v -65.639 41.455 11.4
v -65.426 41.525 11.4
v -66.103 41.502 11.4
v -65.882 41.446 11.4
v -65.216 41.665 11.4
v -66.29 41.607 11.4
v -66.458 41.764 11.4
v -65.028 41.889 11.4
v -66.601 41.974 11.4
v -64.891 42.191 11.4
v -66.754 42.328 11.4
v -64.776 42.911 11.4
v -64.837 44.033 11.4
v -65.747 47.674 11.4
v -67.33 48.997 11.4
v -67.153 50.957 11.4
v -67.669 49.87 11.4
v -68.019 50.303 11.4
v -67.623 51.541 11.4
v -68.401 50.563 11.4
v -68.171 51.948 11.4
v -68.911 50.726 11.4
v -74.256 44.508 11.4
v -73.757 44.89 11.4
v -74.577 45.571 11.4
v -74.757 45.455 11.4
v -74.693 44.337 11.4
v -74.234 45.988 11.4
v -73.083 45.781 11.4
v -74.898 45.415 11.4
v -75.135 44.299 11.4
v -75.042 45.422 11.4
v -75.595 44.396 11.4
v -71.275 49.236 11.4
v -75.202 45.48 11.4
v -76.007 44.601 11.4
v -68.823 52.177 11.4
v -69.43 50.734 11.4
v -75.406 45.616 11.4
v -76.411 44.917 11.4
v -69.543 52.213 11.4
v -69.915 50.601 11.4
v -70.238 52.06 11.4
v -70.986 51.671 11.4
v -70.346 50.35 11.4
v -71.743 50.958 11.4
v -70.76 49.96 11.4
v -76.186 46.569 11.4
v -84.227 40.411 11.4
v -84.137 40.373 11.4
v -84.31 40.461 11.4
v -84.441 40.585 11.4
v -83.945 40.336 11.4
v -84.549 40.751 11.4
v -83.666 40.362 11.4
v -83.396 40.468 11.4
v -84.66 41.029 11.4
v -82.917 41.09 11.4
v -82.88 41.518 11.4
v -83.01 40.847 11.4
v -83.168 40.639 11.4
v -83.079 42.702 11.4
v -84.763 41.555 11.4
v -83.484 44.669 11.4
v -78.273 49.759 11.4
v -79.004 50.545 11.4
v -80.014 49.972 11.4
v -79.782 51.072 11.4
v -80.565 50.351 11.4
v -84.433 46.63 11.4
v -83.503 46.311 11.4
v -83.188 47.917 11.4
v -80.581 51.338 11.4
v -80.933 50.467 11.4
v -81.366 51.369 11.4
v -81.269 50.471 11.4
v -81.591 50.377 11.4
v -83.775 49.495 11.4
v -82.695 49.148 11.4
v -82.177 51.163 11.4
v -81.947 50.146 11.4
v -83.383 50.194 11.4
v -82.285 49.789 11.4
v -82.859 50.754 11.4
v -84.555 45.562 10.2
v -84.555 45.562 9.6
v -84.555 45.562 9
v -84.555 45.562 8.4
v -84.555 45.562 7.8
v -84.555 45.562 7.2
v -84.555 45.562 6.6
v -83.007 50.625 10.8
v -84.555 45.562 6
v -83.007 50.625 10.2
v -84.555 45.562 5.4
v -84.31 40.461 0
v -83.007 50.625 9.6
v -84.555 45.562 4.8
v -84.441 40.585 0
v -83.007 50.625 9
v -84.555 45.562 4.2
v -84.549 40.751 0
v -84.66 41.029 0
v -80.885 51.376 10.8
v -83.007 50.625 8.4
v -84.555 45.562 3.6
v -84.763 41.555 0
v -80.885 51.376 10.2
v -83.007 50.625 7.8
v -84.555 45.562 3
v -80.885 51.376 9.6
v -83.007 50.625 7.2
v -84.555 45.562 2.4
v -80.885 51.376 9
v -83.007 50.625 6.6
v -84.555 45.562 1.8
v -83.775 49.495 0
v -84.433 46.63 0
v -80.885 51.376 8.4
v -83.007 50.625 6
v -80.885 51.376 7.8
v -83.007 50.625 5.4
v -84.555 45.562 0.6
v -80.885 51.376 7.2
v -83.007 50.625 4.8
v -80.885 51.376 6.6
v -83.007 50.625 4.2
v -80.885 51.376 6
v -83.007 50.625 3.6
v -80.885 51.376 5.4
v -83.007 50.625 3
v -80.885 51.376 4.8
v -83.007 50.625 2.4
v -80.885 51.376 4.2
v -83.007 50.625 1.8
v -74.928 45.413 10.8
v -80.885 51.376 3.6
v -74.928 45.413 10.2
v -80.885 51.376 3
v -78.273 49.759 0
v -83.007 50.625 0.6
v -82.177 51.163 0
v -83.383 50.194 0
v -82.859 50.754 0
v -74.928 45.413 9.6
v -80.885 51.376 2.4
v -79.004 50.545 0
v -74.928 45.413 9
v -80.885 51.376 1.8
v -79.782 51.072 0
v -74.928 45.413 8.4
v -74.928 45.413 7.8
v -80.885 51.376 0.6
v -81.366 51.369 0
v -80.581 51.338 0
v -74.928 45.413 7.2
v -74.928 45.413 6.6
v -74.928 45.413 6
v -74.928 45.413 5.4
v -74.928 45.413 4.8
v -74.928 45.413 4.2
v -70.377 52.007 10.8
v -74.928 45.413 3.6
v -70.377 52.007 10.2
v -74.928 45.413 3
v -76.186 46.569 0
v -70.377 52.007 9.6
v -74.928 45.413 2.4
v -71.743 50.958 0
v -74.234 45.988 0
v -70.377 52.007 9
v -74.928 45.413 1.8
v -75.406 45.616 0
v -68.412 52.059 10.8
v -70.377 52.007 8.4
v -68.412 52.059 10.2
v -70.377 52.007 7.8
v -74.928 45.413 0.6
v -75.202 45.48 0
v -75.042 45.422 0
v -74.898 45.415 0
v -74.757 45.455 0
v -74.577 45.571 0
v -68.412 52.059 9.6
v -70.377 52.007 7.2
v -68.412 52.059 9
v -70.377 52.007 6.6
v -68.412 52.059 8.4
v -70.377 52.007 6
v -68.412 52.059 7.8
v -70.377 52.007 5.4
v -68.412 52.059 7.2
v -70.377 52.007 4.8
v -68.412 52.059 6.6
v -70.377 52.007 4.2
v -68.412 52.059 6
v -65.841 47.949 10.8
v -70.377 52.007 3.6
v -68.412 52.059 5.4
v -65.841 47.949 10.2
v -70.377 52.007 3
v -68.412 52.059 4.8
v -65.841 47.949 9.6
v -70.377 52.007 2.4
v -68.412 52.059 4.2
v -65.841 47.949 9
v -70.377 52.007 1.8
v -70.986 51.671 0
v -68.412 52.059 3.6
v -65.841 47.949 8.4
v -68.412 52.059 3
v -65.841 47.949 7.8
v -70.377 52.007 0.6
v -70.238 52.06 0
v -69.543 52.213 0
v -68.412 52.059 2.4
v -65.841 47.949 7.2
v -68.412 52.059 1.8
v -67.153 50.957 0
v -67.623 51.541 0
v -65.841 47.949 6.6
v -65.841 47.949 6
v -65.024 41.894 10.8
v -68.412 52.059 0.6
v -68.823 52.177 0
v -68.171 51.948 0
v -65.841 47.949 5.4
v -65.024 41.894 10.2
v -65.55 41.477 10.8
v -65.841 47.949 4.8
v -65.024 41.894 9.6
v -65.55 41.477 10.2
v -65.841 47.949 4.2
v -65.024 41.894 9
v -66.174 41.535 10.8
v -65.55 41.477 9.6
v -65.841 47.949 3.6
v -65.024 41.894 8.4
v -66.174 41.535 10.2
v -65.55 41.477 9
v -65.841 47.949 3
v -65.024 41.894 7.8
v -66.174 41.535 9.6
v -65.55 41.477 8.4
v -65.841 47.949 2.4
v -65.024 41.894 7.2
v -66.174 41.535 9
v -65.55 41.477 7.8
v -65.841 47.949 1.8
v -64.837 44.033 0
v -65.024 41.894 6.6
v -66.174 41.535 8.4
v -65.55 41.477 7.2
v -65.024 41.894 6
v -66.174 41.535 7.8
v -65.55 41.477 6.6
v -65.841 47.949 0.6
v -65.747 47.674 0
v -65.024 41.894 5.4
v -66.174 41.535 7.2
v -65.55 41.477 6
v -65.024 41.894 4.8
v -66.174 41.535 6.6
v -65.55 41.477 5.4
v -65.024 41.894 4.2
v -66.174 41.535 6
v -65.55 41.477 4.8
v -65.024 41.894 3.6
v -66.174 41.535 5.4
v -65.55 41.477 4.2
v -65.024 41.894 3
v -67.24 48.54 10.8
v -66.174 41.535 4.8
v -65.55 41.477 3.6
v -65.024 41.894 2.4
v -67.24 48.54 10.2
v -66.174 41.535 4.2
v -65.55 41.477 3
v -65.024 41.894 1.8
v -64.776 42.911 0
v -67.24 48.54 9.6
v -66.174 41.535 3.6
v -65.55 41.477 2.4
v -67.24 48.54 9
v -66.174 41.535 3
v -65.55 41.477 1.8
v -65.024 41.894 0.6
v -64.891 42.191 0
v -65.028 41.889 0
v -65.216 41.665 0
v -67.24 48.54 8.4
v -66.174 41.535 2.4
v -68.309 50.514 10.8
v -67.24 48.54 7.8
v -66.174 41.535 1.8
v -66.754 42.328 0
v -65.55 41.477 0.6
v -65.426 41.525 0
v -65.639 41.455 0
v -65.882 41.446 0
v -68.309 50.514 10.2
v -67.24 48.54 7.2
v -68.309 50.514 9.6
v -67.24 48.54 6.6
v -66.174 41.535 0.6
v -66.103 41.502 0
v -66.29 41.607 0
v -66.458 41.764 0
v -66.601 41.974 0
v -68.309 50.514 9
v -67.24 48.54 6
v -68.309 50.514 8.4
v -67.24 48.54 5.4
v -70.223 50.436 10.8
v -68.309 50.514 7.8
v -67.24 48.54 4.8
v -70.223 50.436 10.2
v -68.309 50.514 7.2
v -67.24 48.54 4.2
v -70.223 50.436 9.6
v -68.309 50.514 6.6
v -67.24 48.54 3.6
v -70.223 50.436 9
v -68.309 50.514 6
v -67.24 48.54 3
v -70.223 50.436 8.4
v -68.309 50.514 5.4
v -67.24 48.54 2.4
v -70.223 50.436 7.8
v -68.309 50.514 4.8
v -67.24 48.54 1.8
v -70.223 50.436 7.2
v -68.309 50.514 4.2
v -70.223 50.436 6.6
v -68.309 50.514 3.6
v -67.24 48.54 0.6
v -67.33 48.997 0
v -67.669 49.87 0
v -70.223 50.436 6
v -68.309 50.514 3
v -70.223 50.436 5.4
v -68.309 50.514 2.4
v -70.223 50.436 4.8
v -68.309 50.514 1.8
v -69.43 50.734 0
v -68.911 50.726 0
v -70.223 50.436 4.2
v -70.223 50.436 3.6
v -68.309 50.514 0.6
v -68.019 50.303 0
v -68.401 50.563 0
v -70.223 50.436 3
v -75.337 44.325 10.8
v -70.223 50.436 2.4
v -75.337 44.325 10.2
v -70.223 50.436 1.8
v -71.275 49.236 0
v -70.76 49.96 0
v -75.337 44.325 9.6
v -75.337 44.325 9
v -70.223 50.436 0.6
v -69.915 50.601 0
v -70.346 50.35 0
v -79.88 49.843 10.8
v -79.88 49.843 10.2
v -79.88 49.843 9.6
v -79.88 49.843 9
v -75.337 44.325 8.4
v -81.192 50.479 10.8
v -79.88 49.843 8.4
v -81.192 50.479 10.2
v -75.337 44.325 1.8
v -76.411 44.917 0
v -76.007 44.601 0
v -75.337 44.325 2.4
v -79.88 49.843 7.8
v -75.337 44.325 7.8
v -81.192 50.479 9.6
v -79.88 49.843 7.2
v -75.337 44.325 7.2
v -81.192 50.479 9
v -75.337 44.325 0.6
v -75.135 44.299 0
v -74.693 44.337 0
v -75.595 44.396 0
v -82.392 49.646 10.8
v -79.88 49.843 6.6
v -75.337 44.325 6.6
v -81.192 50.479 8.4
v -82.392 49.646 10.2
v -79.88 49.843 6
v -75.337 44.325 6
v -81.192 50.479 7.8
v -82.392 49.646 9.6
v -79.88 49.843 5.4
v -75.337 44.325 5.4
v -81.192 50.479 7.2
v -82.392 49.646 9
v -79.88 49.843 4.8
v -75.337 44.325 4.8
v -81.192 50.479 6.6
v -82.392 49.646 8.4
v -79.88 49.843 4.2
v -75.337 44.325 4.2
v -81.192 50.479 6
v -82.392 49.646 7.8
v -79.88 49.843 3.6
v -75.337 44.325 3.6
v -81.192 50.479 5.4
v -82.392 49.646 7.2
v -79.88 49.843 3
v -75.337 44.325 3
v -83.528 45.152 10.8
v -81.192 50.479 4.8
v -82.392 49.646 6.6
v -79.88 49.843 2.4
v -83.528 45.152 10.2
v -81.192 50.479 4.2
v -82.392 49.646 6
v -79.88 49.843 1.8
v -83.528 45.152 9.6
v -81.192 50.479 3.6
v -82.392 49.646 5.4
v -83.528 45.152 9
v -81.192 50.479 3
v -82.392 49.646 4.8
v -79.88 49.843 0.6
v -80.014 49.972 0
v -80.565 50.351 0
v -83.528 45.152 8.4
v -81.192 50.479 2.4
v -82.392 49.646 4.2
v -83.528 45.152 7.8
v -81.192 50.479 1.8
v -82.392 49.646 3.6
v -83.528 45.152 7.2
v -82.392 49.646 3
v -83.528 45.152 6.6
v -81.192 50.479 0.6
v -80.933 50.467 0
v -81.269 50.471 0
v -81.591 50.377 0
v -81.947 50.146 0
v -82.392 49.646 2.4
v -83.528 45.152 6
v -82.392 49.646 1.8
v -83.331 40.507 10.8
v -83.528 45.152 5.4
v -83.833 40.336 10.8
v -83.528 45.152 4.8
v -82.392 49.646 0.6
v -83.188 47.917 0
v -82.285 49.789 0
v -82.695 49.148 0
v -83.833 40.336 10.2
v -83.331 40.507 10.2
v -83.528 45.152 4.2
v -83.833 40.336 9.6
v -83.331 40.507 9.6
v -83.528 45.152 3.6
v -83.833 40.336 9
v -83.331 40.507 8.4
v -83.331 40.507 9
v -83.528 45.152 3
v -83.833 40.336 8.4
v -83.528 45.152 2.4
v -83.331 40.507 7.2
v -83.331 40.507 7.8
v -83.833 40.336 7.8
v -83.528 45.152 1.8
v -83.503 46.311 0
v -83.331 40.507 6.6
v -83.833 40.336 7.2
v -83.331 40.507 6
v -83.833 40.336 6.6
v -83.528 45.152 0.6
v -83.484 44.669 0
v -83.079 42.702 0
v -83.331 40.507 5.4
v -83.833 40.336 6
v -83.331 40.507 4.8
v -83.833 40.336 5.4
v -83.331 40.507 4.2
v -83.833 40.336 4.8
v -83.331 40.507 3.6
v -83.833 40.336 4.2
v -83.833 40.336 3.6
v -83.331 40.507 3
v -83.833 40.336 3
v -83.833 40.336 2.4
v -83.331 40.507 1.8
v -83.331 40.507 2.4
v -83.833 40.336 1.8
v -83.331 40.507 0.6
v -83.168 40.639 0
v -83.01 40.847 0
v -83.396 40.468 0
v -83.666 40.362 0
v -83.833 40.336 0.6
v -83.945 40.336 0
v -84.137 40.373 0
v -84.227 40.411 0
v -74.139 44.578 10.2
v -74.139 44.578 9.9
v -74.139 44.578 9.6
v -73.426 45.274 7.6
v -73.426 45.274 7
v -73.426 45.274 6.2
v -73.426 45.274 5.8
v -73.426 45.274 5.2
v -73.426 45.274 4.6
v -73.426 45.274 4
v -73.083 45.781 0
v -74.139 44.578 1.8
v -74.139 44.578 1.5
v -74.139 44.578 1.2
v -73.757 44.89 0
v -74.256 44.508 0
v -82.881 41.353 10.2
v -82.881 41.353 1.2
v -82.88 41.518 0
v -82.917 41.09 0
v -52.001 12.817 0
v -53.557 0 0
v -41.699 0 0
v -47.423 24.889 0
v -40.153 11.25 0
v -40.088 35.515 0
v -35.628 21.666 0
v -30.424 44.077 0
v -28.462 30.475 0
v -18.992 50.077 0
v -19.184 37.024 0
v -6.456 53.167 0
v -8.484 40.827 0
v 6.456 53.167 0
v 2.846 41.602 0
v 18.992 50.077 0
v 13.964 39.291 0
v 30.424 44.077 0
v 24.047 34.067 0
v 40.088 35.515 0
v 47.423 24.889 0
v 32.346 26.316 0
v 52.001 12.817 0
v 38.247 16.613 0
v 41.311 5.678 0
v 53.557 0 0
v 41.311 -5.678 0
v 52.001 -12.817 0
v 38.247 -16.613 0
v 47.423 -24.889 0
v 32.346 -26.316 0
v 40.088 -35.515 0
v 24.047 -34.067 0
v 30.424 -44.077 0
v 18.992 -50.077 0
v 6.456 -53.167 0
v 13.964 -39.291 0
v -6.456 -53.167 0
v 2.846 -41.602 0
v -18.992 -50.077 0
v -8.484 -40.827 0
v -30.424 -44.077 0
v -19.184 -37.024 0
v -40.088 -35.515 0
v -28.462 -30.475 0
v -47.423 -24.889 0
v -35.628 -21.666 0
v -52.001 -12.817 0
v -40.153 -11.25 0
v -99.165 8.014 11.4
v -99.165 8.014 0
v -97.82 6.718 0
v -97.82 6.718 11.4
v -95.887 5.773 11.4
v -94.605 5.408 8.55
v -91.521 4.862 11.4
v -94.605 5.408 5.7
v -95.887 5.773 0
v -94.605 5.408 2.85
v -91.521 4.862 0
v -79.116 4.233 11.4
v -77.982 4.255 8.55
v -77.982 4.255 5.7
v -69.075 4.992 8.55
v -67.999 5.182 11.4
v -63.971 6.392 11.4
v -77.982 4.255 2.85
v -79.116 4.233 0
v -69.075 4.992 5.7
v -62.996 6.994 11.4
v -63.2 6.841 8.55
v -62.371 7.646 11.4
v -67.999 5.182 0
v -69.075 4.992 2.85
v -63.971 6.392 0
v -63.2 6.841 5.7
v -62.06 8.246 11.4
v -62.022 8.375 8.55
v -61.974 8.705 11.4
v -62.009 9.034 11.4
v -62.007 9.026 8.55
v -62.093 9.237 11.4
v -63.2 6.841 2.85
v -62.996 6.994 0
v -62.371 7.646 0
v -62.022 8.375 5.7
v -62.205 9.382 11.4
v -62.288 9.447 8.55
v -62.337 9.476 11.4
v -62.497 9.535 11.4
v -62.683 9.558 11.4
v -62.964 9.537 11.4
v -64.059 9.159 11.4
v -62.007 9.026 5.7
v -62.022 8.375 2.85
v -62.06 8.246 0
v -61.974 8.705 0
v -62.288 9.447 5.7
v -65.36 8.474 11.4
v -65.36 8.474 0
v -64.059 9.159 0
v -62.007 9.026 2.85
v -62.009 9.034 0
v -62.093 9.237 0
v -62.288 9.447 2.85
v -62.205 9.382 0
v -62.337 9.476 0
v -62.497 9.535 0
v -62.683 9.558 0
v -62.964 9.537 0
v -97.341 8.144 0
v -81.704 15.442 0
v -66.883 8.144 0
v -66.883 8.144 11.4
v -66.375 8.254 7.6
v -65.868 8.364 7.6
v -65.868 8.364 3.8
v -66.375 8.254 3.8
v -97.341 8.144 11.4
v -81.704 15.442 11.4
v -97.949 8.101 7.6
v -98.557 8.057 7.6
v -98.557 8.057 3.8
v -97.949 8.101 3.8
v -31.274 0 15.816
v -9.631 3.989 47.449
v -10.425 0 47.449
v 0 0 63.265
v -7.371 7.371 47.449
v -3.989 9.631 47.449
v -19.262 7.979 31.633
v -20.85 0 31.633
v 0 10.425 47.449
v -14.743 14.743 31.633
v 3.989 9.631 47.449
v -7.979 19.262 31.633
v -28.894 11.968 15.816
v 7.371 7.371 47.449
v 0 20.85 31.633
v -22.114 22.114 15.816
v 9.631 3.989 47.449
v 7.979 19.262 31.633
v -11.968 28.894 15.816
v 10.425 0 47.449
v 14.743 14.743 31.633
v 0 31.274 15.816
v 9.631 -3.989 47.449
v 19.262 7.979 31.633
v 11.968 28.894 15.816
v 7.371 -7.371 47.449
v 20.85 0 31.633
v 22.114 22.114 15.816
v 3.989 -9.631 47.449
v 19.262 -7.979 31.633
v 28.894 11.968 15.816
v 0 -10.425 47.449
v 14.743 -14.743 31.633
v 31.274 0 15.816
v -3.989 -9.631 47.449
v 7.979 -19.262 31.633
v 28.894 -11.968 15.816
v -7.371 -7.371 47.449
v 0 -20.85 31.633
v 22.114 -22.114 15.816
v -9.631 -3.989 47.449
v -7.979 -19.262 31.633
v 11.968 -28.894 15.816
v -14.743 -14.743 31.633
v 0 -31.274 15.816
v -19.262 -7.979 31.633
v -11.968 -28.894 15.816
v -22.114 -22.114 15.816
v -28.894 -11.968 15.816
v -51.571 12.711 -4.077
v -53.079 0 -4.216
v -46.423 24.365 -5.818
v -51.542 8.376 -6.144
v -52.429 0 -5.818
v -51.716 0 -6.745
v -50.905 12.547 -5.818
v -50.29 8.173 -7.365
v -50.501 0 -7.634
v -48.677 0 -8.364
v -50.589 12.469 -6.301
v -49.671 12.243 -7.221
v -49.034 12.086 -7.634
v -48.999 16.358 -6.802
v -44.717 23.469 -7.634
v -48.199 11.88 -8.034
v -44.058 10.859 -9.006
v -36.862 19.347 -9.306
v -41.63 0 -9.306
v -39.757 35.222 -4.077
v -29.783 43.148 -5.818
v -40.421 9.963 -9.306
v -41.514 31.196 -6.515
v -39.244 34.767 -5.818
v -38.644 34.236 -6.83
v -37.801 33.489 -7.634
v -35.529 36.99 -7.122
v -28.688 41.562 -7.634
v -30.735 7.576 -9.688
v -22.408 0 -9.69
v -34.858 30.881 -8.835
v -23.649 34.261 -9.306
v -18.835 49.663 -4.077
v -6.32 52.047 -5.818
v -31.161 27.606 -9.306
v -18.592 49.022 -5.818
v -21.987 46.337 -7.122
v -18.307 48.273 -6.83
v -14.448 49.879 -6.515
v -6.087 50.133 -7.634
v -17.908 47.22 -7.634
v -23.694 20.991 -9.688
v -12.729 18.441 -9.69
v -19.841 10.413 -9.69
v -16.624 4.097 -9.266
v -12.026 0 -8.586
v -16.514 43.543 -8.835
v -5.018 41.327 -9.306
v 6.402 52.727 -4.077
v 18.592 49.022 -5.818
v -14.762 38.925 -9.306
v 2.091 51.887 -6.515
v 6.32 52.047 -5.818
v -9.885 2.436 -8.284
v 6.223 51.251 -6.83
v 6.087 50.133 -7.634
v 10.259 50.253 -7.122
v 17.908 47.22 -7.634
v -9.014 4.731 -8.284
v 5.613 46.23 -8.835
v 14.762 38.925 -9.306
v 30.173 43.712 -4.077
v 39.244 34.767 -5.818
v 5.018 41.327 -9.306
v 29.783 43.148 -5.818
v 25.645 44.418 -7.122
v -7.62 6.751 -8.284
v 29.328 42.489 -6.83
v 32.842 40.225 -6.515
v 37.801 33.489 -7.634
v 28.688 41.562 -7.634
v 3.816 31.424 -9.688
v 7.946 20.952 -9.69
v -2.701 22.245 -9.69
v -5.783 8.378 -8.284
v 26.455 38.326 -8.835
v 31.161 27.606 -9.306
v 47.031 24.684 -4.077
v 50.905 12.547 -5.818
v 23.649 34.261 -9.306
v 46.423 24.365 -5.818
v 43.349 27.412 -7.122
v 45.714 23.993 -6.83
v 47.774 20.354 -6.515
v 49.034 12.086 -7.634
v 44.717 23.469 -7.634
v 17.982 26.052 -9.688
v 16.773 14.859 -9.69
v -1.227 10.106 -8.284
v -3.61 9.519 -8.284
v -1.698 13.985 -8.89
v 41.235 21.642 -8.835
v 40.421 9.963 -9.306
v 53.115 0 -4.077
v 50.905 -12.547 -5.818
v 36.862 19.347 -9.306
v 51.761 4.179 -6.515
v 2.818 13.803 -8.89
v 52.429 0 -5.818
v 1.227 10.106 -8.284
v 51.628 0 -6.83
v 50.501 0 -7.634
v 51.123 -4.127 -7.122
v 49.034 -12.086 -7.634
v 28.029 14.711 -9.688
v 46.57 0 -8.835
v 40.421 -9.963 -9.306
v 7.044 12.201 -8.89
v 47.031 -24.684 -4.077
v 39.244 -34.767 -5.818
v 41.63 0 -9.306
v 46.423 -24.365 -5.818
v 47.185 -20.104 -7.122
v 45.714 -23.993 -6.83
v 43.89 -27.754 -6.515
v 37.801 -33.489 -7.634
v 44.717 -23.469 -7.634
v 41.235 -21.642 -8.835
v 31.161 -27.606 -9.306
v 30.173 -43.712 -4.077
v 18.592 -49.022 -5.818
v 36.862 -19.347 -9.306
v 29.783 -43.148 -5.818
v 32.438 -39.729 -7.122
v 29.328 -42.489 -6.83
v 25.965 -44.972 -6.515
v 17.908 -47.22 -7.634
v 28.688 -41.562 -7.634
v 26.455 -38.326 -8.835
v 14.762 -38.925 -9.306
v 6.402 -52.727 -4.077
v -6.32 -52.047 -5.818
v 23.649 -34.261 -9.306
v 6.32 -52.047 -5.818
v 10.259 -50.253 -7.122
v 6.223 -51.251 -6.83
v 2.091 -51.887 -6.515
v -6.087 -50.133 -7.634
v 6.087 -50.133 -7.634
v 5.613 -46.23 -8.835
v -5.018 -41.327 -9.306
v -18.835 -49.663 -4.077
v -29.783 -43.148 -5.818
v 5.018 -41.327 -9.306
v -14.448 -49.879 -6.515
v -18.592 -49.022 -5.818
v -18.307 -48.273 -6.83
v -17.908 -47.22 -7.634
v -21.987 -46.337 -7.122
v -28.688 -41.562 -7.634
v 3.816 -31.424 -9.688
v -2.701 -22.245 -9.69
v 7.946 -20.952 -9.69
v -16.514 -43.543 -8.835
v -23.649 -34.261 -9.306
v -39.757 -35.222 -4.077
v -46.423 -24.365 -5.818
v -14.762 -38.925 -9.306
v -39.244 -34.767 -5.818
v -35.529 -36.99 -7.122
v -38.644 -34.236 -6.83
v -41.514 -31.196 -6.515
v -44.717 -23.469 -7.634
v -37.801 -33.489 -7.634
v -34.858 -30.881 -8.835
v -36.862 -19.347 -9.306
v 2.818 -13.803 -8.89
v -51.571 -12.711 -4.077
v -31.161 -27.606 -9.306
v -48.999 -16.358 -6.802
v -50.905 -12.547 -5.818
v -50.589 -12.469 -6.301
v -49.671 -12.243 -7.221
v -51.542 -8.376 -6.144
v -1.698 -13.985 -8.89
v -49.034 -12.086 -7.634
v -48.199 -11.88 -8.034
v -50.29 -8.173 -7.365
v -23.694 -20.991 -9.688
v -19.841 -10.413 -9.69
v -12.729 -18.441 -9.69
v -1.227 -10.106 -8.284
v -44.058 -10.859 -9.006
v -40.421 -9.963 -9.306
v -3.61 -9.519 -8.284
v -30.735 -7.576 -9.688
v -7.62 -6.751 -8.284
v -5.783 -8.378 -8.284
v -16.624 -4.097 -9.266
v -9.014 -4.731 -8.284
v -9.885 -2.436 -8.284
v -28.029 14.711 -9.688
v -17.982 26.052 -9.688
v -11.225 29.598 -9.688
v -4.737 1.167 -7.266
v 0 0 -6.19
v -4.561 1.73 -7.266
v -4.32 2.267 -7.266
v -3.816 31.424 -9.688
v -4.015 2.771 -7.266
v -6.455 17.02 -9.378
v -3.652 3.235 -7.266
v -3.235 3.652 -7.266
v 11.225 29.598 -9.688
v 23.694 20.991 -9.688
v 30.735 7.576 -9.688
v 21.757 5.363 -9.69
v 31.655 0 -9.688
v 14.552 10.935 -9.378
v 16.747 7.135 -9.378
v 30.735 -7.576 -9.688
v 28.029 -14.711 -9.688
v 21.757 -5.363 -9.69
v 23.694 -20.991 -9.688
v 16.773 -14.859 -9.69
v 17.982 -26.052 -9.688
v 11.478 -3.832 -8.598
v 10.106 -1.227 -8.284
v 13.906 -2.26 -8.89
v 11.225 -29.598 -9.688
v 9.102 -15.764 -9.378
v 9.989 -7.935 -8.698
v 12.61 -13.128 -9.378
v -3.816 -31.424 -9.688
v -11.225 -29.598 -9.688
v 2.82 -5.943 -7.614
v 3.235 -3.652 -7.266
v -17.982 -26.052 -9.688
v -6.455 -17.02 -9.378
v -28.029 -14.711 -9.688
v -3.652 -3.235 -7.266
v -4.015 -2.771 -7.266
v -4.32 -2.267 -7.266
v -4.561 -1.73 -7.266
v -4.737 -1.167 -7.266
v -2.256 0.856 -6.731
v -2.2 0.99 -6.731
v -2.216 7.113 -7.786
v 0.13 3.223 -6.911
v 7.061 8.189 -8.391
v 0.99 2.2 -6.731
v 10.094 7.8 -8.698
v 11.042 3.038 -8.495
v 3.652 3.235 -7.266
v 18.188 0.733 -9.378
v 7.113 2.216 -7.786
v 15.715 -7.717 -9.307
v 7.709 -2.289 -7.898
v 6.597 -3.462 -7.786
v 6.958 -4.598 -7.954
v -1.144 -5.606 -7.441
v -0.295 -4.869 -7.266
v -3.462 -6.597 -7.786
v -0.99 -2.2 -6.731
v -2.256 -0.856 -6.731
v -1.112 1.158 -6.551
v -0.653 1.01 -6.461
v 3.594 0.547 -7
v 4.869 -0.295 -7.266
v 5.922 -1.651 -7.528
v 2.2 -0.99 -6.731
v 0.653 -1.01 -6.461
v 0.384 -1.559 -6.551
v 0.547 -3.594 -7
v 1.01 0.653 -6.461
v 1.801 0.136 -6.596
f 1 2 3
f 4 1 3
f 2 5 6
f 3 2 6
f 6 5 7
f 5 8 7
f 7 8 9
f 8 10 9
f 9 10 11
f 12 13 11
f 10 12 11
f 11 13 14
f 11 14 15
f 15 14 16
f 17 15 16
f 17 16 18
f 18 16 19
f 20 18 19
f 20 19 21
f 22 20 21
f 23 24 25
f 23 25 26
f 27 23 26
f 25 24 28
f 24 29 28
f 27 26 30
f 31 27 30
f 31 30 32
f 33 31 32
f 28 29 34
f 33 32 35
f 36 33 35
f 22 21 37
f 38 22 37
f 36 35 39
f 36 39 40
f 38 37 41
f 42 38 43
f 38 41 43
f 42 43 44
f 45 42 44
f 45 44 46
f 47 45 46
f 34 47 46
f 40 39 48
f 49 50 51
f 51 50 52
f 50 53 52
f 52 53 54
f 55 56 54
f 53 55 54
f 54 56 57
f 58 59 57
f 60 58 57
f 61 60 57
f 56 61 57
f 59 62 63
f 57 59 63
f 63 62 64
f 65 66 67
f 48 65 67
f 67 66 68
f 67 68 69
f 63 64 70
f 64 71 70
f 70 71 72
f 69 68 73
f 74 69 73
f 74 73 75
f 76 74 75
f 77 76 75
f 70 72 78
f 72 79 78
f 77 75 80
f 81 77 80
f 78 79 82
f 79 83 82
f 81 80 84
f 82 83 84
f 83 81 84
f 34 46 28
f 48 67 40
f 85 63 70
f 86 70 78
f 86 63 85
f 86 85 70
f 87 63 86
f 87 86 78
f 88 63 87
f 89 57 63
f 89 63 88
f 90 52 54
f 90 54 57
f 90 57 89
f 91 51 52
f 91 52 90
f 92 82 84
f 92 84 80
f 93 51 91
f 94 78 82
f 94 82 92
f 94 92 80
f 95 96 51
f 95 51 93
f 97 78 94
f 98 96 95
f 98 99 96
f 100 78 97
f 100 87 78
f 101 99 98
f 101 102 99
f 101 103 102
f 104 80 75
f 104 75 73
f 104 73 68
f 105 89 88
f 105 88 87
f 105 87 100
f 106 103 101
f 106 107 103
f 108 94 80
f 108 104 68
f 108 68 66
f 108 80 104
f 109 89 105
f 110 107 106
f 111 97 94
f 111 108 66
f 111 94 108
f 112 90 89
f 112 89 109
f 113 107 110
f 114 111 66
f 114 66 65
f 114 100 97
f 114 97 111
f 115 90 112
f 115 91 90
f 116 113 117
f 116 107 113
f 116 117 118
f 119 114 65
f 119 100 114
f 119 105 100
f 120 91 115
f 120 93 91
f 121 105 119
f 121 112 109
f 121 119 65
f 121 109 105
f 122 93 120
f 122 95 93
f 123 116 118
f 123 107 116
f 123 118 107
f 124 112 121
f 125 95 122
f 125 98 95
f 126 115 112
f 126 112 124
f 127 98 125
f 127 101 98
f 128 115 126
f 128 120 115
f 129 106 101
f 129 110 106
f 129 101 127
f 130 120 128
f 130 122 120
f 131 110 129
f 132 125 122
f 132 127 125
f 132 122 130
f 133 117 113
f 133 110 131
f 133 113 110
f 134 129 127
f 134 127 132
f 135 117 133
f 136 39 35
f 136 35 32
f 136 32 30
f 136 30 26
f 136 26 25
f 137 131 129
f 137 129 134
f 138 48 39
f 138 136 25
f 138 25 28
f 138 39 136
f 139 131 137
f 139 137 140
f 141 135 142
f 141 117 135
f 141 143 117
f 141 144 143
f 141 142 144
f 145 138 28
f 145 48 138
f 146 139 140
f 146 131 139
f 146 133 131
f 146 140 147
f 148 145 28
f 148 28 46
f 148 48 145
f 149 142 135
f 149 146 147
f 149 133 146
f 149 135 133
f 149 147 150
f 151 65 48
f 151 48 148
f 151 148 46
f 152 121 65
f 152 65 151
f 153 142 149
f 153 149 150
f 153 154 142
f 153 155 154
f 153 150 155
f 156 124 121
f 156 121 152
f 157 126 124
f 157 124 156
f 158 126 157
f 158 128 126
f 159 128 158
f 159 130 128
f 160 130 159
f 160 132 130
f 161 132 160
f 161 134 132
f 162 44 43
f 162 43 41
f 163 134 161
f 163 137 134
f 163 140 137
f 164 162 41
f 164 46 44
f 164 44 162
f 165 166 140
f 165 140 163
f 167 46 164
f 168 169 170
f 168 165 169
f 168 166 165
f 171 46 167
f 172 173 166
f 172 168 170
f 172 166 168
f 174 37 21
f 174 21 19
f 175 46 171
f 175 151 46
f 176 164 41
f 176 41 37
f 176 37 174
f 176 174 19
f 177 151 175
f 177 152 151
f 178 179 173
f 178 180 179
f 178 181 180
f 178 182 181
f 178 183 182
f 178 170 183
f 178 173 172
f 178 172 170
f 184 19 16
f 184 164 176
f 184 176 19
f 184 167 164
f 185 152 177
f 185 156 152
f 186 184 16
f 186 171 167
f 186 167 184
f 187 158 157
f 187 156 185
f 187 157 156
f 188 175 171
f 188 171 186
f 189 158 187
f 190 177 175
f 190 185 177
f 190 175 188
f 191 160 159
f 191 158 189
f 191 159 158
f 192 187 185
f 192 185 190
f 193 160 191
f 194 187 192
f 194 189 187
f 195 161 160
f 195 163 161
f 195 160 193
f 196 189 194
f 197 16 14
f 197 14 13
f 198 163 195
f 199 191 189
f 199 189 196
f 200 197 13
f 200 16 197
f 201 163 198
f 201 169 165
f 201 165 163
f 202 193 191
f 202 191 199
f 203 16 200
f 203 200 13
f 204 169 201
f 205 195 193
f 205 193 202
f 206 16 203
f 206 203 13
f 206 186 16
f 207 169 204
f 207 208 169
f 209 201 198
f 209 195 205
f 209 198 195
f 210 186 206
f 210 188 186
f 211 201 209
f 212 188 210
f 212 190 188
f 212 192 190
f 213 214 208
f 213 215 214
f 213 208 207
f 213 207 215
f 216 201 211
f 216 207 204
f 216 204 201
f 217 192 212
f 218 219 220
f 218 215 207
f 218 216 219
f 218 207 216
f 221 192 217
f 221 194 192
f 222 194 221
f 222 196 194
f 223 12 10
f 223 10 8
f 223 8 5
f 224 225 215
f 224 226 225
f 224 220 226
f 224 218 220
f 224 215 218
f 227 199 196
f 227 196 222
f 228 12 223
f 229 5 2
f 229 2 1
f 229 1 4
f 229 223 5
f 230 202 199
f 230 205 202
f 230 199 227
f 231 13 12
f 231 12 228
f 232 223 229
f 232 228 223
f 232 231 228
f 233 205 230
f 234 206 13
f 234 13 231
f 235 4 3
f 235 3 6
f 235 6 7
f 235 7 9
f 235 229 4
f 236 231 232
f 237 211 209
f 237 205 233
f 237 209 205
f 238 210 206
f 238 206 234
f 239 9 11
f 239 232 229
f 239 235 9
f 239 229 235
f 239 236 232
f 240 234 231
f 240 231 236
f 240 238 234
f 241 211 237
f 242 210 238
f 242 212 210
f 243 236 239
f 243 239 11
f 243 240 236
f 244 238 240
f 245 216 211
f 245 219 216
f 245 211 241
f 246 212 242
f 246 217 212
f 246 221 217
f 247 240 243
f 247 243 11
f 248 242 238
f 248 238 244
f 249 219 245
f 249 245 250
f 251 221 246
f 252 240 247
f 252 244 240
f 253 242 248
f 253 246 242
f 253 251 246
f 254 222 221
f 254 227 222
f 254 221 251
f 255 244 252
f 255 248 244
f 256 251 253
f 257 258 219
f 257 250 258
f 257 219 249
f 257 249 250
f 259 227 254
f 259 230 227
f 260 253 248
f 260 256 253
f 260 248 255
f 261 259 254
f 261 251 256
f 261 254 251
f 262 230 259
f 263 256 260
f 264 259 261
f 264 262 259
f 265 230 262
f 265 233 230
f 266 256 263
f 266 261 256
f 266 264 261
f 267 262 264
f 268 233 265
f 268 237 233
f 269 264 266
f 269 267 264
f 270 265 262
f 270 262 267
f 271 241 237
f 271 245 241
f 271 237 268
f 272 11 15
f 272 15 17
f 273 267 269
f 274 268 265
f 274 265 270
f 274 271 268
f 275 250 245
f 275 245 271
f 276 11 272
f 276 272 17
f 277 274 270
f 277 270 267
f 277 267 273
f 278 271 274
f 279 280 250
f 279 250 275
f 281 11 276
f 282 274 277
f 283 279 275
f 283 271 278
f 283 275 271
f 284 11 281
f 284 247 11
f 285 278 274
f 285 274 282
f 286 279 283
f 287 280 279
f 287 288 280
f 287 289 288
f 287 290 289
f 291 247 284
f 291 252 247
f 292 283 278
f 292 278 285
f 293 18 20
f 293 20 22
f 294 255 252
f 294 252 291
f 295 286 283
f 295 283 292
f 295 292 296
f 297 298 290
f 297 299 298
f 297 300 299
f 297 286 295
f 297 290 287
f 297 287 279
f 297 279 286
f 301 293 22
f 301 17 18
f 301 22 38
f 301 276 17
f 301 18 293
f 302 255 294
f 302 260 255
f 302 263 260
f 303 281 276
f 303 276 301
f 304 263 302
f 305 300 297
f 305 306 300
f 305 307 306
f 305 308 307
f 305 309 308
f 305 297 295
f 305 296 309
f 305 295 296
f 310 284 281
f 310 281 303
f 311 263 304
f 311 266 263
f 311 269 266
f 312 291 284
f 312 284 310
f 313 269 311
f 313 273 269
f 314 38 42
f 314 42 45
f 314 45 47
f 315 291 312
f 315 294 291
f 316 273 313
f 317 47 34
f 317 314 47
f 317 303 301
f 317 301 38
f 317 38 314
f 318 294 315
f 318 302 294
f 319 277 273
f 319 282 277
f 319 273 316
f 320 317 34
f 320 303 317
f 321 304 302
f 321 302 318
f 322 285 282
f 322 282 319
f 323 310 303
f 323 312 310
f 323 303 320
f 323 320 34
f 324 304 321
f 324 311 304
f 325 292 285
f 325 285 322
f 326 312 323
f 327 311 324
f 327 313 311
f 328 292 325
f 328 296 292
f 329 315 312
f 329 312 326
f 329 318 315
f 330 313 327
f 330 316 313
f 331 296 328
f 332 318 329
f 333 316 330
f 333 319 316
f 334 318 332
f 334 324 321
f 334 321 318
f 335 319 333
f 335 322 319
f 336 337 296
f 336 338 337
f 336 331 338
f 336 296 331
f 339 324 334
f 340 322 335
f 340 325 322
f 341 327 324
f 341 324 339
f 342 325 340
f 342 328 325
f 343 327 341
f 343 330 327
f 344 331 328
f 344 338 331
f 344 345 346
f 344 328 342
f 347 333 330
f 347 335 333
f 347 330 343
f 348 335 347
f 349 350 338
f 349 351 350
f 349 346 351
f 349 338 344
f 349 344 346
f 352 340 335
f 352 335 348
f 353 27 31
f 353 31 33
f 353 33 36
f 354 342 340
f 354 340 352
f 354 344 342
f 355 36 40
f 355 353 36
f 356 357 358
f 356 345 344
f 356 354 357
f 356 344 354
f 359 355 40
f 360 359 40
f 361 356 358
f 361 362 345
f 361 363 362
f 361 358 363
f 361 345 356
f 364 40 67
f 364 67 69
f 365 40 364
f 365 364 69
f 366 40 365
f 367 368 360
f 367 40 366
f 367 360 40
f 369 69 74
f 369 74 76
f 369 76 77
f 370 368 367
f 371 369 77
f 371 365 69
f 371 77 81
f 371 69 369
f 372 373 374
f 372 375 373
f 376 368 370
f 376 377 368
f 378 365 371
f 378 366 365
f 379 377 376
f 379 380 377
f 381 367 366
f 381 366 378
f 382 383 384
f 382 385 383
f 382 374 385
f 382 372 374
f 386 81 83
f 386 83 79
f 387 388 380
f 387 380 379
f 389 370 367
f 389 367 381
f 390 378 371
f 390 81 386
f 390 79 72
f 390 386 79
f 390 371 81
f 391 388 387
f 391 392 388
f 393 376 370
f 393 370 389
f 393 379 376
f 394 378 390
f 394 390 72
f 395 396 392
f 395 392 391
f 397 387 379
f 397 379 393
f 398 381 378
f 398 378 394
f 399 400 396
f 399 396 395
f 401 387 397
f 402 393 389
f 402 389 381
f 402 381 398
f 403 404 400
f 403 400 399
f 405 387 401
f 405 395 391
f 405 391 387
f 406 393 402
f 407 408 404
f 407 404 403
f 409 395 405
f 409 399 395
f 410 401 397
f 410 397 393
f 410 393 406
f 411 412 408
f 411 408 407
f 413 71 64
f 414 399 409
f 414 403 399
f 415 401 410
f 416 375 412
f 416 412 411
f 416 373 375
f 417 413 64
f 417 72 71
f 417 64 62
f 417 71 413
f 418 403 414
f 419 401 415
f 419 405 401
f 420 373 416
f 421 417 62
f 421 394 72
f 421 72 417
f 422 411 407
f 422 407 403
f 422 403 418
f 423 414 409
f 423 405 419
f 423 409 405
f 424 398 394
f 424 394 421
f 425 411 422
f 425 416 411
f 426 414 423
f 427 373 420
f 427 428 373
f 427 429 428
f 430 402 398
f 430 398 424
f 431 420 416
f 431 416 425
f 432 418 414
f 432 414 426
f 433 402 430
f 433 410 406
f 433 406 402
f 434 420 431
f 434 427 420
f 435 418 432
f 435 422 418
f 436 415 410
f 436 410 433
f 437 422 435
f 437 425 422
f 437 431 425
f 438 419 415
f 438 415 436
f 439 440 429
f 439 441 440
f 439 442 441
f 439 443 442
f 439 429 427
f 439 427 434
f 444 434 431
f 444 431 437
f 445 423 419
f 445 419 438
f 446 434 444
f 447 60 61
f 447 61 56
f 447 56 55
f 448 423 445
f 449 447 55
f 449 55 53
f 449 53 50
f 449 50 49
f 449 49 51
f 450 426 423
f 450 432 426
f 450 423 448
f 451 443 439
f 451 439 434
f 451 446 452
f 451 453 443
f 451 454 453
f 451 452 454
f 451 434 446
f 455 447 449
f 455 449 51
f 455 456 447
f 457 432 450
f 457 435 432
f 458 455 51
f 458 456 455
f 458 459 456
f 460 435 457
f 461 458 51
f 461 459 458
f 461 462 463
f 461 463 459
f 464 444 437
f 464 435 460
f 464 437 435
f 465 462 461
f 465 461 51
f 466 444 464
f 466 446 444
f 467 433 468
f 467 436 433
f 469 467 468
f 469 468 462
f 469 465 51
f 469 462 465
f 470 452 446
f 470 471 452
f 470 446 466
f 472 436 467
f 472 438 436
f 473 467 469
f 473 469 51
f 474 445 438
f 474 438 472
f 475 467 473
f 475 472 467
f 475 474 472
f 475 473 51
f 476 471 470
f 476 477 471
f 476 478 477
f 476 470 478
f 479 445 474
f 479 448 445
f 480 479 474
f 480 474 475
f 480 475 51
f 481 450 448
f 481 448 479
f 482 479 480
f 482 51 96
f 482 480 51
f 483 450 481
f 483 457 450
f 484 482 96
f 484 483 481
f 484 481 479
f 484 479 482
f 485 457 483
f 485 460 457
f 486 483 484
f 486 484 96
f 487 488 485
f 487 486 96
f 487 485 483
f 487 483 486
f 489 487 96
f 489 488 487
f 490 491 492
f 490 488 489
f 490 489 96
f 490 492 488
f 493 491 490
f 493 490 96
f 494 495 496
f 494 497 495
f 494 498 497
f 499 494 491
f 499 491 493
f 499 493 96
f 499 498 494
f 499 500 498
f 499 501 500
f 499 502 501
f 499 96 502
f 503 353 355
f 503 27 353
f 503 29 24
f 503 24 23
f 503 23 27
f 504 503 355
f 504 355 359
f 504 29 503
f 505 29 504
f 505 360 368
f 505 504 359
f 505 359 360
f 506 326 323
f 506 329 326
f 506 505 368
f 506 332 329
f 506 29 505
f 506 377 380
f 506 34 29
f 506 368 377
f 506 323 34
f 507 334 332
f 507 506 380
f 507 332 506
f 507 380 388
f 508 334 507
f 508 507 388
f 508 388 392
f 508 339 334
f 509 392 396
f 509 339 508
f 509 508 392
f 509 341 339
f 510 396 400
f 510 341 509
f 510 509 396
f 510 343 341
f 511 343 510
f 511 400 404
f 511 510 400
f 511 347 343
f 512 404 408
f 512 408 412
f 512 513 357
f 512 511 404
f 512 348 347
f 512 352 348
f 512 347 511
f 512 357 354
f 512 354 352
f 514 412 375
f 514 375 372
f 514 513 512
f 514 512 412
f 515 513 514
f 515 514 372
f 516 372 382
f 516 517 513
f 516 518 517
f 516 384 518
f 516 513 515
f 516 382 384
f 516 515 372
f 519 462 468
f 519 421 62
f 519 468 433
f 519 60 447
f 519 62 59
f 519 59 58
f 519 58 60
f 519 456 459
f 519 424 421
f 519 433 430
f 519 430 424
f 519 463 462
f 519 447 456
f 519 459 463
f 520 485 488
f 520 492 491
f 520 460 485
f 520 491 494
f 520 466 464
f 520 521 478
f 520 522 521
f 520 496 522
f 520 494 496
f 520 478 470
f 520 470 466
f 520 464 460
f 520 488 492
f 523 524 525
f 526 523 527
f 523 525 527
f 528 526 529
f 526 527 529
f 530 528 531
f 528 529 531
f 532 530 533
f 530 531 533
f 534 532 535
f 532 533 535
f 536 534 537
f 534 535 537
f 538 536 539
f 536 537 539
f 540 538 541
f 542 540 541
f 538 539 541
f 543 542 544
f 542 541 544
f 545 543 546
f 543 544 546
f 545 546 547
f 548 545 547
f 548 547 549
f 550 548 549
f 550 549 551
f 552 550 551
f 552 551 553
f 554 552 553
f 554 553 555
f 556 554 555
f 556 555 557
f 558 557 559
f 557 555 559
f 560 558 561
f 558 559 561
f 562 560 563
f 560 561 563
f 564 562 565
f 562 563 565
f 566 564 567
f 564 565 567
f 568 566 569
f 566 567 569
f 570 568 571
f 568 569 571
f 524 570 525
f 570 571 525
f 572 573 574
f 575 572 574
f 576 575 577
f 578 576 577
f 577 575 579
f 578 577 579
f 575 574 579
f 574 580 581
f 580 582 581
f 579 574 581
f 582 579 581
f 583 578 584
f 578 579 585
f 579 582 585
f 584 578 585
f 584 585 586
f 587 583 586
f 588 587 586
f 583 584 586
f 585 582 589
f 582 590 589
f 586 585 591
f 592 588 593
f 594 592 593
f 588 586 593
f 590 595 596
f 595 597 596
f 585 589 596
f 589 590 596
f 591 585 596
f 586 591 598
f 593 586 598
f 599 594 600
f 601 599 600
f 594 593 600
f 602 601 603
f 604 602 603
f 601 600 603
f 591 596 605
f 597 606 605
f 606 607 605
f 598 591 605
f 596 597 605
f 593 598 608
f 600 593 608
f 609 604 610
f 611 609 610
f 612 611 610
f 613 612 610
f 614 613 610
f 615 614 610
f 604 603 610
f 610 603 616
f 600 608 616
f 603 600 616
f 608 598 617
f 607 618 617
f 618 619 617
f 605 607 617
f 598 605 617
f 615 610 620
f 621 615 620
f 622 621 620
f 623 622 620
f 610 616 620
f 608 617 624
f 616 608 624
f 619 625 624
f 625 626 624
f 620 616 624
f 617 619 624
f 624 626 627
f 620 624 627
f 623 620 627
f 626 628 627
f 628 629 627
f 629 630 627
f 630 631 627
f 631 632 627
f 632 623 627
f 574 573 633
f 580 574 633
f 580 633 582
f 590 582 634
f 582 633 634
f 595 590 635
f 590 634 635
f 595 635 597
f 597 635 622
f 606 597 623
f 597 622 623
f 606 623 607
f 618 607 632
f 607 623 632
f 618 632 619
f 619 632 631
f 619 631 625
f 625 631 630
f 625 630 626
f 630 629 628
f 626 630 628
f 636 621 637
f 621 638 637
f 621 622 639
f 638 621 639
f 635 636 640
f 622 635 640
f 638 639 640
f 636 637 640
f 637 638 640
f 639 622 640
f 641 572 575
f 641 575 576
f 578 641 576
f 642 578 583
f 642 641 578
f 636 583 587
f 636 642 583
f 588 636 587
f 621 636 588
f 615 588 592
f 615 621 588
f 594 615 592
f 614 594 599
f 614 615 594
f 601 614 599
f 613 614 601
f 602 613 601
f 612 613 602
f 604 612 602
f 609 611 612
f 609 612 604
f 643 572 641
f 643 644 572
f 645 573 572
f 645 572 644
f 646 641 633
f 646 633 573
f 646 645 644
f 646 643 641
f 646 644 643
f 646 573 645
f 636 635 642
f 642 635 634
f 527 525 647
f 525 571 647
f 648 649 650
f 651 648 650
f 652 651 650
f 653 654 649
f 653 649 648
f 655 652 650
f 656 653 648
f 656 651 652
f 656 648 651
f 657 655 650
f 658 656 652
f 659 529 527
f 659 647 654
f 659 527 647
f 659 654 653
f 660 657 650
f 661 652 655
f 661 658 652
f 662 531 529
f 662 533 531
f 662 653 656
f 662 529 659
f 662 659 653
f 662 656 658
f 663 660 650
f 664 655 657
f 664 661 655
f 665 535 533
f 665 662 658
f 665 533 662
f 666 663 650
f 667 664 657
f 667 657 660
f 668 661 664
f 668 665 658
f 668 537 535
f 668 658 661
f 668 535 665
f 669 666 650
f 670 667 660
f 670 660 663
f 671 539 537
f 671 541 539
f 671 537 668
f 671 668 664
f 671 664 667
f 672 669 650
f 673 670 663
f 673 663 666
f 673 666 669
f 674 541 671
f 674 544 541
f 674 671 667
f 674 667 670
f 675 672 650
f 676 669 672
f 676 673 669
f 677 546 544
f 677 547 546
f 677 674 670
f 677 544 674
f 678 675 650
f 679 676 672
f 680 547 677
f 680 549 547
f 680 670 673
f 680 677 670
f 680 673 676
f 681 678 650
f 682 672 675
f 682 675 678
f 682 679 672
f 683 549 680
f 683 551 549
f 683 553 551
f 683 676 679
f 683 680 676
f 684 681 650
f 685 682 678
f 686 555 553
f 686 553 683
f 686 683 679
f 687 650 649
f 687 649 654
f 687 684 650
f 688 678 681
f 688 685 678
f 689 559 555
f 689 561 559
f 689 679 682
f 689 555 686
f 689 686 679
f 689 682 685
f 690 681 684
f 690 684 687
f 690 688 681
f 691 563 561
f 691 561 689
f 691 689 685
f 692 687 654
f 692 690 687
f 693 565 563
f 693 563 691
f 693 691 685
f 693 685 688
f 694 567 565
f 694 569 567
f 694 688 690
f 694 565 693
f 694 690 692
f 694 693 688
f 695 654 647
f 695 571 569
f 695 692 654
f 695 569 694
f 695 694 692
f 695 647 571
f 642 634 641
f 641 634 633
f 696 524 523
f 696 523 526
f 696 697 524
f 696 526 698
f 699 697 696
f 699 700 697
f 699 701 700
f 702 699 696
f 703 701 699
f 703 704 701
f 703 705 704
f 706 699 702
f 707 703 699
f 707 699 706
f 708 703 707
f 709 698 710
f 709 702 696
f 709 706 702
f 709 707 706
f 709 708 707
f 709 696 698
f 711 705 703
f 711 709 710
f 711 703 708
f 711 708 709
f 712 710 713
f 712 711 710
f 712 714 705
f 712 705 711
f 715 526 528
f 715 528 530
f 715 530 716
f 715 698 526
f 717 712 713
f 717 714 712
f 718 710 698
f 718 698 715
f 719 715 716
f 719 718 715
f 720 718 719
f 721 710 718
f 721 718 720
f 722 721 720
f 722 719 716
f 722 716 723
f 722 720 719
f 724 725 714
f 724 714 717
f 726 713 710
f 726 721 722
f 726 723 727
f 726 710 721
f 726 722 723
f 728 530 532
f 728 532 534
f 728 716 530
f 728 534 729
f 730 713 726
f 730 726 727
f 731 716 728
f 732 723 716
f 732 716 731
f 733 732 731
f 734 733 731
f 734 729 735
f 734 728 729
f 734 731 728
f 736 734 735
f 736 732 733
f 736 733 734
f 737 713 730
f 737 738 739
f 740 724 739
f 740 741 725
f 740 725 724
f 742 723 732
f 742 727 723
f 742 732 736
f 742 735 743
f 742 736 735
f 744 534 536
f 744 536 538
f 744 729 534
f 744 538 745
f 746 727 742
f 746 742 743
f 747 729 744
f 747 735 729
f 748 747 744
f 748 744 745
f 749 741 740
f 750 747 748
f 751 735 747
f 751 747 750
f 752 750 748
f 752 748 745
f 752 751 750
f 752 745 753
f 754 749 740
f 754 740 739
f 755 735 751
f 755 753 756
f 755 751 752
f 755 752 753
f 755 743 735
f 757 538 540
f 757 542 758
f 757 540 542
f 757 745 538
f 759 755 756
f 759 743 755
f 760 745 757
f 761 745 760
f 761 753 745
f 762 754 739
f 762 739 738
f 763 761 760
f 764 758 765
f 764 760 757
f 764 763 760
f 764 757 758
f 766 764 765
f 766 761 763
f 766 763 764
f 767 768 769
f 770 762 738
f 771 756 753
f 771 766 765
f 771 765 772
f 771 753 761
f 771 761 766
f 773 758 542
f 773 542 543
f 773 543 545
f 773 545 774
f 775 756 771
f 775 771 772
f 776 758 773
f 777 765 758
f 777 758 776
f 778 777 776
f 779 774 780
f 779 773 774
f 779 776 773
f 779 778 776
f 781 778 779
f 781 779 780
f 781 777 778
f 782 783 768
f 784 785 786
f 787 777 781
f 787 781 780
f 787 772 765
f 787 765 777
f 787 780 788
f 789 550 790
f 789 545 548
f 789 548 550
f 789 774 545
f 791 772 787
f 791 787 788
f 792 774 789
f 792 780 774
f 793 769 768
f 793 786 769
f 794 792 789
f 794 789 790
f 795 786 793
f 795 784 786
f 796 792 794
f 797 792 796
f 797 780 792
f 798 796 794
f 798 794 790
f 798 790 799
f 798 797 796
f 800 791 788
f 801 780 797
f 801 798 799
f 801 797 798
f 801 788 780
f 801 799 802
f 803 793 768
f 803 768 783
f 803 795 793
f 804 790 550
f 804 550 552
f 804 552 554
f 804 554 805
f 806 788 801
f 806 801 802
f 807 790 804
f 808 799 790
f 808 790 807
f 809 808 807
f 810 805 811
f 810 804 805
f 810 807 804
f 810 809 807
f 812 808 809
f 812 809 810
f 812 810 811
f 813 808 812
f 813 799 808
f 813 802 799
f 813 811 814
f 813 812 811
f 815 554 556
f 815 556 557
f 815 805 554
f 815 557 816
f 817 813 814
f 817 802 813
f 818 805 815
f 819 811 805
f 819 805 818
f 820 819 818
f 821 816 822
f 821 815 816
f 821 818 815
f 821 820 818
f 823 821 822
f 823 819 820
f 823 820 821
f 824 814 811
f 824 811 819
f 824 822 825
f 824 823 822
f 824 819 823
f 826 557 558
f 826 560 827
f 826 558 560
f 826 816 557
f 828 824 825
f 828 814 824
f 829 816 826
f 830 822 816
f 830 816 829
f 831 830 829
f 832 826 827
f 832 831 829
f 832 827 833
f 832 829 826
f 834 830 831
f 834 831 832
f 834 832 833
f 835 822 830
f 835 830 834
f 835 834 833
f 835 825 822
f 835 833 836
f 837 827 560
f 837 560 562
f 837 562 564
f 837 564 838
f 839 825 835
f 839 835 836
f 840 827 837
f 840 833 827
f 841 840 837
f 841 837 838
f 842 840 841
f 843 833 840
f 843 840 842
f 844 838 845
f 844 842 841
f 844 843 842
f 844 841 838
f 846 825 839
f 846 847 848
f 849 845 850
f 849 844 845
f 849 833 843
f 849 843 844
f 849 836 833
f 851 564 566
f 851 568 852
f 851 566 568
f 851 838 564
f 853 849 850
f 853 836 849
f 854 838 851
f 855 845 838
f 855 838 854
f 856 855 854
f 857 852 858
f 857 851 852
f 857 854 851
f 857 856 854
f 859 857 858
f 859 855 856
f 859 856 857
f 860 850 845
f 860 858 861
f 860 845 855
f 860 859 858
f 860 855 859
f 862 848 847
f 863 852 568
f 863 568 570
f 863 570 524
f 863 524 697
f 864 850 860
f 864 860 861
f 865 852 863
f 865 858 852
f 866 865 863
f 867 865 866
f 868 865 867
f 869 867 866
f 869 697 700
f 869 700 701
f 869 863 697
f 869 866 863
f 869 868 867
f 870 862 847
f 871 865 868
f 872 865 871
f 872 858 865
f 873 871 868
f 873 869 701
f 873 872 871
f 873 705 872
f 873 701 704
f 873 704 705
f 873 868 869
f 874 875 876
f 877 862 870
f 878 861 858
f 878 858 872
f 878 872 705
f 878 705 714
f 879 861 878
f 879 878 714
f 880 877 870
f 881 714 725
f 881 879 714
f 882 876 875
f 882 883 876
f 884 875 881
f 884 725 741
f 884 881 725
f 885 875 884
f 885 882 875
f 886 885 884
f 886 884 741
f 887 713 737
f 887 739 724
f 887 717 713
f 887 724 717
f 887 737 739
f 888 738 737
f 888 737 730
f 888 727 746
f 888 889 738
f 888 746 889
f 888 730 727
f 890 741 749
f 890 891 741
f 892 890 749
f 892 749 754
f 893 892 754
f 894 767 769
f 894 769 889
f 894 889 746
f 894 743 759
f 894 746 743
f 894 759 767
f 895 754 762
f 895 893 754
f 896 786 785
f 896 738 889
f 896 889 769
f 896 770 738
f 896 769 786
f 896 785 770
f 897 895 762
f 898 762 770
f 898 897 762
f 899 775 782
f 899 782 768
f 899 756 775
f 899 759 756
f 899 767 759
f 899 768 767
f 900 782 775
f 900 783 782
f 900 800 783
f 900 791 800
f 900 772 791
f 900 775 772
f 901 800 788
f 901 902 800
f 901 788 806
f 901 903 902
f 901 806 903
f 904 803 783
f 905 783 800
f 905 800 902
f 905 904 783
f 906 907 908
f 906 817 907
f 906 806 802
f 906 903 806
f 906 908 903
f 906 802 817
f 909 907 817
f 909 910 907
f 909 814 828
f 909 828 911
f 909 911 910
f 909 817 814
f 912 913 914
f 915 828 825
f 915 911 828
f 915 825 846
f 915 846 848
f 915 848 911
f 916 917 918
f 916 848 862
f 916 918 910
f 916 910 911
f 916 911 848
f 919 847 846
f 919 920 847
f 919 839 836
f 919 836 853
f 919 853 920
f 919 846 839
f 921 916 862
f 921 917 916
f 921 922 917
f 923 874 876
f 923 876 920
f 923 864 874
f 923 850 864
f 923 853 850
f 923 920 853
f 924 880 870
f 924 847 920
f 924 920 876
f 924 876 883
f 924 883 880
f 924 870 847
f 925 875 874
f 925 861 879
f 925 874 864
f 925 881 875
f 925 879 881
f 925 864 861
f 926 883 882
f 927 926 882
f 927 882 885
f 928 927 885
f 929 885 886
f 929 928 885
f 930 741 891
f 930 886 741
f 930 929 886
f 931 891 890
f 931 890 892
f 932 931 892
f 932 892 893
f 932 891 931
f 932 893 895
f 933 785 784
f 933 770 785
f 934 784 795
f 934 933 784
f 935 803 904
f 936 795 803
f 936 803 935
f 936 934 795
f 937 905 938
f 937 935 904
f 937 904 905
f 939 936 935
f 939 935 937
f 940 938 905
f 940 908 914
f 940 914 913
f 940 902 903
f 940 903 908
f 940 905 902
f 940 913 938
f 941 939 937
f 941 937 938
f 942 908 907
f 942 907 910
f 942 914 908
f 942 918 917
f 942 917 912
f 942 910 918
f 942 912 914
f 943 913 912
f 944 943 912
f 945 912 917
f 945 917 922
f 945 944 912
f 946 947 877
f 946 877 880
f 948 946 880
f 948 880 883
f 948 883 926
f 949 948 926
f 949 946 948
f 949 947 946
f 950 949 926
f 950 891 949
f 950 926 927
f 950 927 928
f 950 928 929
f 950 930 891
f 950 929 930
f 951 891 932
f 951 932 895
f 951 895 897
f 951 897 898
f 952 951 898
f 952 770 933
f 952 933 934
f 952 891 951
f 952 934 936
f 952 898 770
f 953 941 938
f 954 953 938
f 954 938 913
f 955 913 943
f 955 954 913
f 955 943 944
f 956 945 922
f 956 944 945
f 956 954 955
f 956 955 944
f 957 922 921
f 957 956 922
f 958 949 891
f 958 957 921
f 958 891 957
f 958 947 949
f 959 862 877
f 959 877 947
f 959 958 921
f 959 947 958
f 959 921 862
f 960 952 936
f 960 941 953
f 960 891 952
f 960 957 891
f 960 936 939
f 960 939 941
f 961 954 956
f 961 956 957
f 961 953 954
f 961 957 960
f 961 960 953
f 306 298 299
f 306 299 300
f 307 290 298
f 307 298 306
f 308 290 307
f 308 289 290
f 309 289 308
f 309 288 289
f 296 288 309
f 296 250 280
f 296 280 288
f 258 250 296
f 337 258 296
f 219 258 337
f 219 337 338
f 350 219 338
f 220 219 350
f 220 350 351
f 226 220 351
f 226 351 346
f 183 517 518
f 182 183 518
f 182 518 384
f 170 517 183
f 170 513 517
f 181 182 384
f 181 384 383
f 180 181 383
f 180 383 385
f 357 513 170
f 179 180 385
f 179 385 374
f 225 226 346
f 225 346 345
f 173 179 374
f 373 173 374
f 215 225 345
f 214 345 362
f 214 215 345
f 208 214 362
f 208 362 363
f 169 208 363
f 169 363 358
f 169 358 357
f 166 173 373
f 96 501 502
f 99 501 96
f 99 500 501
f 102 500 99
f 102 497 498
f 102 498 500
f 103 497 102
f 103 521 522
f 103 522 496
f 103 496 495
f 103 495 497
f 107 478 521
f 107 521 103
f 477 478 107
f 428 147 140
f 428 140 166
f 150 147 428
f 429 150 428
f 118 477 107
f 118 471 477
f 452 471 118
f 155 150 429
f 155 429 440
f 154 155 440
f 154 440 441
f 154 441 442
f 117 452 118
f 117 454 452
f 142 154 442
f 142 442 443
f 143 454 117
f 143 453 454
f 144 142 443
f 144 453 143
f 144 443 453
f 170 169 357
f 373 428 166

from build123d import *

# Parameters (mm, degrees)
F3_DEPTH = 11.4


with BuildPart() as f1:
    # F0 (on Front) → F1 (revolve)
    with BuildSketch(Plane.XZ):
        with BuildLine():
            Line((0, 63.2652342319), (-41.6990220547, 0))
            add(Edge.make_bspline(
                [(-53.5571835935, 0), (-49.6044630806, 0), (-45.6517425676, 0), (-41.6990220547, 0)],
                knots=[0, 0, 0, 0, 11.8581615388, 11.8581615388, 11.8581615388, 11.8581615388], degree=3))
            add(Edge.make_bspline(
                [(-53.5571835935, 0), (-53.4334371926, -2.6908141816), (-53.1402154716, -9.066798934), (-37.1676080808, -9.3806462258), (-23.1685894488, -10.1839054648), (-9.4873160883, -8.3321297601), (-2.9764906365, -6.8618515729), (0, -6.1896988191)],
                knots=[0, 0, 0, 0, 0.1580409291, 0.374483887, 0.6032630747, 0.8186276453, 1, 1, 1, 1], degree=3))
            Line((0, -6.1896988191), (0, 63.2652342319))
        make_face()
    revolve(axis=Axis((0, 0, 28.5377677064), (0, 0, -1)))


with BuildPart() as f3:
    # F2 (on Top) → F3 (new body)
    with BuildSketch(Plane.XY):
        with BuildLine():
            add(Edge.make_bspline(
                [(-84.3102112412, 40.4610857368), (-85.0529291227, 40.9958786506), (-84.5303607917, 45.7398508686), (-83.9514385702, 51.2382567246), (-78.3571226382, 52.0567477514), (-74.6691999848, 41.6802312333), (-72.6076012928, 51.9031212278), (-67.9525880261, 52.6750588018), (-66.0730074411, 49.2024115409), (-63.8207430634, 41.5170017131), (-67.5488511999, 41.120062853), (-66.6687651288, 48.7345215145), (-68.3108975024, 50.94301662), (-71.2826769252, 50.666767686), (-73.1011401395, 44.2158299469), (-76.825645086, 44.0279276792), (-79.3458870987, 50.2461534997), (-82.3364477721, 50.9255849083), (-84.3799730162, 45.1231148531), (-82.075612545, 40.7623636732), (-83.9211769694, 40.1809621838), (-84.3102112412, 40.4610857368)],
                knots=[0, 0, 0, 0, 0.0578178757, 0.1183877548, 0.1697248251, 0.2368075858, 0.3019965385, 0.3511601922, 0.4019906506, 0.4713398966, 0.5024901043, 0.5703022821, 0.6110152595, 0.6490790515, 0.7130945011, 0.7539779882, 0.8189217919, 0.8555802004, 0.9156756697, 0.9697151021, 1, 1, 1, 1], degree=3))
        make_face()
    extrude(amount=F3_DEPTH)


with BuildPart() as f3b:
    # F2 (on Top) → F3, piece 2 (new body)
    with BuildSketch(Plane.XY):
        Polygon((-66.8827426476, 8.1443404779), (-81.7040205002, 15.4416691512), (-97.341157496, 8.1443404779), align=None)
        with BuildLine():
            Line((-66.8827426476, 8.1443404779), (-97.341157496, 8.1443404779))
            add(Edge.make_bspline(
                [(-99.1654917598, 8.0140307546), (-98.5573803385, 8.057467329), (-97.9492689172, 8.1009039034), (-97.341157496, 8.1443404779)],
                knots=[0, 0, 0, 0, 1.8289822662, 1.8289822662, 1.8289822662, 1.8289822662], degree=3))
            add(Edge.make_bspline(
                [(-99.1654917598, 8.0140307546), (-98.3408898529, 7.0588085926), (-95.4990123071, 3.7667662258), (-62.0559544674, 3.5124450192), (-61.6722541601, 10.4063057996), (-64.0620025475, 9.2080926787), (-65.3599273192, 8.4739090018)],
                knots=[0, 0, 0, 0, 0.1987994554, 0.6851350983, 0.8292680694, 0.9780977849, 0.9780977849, 0.9780977849, 0.9780977849], degree=3))
            add(Edge.make_bspline(
                [(-65.3599273192, 8.4739090018), (-65.8677813455, 8.3644928742), (-66.3748886213, 8.2537566055), (-66.8827426476, 8.1443404779)],
                knots=[0, 0, 0, 0, 1.5580699396, 1.5580699396, 1.5580699396, 1.5580699396], degree=3))
        make_face()
    extrude(amount=F3_DEPTH)


solid = Compound([f1.part, f3.part, f3b.part])
